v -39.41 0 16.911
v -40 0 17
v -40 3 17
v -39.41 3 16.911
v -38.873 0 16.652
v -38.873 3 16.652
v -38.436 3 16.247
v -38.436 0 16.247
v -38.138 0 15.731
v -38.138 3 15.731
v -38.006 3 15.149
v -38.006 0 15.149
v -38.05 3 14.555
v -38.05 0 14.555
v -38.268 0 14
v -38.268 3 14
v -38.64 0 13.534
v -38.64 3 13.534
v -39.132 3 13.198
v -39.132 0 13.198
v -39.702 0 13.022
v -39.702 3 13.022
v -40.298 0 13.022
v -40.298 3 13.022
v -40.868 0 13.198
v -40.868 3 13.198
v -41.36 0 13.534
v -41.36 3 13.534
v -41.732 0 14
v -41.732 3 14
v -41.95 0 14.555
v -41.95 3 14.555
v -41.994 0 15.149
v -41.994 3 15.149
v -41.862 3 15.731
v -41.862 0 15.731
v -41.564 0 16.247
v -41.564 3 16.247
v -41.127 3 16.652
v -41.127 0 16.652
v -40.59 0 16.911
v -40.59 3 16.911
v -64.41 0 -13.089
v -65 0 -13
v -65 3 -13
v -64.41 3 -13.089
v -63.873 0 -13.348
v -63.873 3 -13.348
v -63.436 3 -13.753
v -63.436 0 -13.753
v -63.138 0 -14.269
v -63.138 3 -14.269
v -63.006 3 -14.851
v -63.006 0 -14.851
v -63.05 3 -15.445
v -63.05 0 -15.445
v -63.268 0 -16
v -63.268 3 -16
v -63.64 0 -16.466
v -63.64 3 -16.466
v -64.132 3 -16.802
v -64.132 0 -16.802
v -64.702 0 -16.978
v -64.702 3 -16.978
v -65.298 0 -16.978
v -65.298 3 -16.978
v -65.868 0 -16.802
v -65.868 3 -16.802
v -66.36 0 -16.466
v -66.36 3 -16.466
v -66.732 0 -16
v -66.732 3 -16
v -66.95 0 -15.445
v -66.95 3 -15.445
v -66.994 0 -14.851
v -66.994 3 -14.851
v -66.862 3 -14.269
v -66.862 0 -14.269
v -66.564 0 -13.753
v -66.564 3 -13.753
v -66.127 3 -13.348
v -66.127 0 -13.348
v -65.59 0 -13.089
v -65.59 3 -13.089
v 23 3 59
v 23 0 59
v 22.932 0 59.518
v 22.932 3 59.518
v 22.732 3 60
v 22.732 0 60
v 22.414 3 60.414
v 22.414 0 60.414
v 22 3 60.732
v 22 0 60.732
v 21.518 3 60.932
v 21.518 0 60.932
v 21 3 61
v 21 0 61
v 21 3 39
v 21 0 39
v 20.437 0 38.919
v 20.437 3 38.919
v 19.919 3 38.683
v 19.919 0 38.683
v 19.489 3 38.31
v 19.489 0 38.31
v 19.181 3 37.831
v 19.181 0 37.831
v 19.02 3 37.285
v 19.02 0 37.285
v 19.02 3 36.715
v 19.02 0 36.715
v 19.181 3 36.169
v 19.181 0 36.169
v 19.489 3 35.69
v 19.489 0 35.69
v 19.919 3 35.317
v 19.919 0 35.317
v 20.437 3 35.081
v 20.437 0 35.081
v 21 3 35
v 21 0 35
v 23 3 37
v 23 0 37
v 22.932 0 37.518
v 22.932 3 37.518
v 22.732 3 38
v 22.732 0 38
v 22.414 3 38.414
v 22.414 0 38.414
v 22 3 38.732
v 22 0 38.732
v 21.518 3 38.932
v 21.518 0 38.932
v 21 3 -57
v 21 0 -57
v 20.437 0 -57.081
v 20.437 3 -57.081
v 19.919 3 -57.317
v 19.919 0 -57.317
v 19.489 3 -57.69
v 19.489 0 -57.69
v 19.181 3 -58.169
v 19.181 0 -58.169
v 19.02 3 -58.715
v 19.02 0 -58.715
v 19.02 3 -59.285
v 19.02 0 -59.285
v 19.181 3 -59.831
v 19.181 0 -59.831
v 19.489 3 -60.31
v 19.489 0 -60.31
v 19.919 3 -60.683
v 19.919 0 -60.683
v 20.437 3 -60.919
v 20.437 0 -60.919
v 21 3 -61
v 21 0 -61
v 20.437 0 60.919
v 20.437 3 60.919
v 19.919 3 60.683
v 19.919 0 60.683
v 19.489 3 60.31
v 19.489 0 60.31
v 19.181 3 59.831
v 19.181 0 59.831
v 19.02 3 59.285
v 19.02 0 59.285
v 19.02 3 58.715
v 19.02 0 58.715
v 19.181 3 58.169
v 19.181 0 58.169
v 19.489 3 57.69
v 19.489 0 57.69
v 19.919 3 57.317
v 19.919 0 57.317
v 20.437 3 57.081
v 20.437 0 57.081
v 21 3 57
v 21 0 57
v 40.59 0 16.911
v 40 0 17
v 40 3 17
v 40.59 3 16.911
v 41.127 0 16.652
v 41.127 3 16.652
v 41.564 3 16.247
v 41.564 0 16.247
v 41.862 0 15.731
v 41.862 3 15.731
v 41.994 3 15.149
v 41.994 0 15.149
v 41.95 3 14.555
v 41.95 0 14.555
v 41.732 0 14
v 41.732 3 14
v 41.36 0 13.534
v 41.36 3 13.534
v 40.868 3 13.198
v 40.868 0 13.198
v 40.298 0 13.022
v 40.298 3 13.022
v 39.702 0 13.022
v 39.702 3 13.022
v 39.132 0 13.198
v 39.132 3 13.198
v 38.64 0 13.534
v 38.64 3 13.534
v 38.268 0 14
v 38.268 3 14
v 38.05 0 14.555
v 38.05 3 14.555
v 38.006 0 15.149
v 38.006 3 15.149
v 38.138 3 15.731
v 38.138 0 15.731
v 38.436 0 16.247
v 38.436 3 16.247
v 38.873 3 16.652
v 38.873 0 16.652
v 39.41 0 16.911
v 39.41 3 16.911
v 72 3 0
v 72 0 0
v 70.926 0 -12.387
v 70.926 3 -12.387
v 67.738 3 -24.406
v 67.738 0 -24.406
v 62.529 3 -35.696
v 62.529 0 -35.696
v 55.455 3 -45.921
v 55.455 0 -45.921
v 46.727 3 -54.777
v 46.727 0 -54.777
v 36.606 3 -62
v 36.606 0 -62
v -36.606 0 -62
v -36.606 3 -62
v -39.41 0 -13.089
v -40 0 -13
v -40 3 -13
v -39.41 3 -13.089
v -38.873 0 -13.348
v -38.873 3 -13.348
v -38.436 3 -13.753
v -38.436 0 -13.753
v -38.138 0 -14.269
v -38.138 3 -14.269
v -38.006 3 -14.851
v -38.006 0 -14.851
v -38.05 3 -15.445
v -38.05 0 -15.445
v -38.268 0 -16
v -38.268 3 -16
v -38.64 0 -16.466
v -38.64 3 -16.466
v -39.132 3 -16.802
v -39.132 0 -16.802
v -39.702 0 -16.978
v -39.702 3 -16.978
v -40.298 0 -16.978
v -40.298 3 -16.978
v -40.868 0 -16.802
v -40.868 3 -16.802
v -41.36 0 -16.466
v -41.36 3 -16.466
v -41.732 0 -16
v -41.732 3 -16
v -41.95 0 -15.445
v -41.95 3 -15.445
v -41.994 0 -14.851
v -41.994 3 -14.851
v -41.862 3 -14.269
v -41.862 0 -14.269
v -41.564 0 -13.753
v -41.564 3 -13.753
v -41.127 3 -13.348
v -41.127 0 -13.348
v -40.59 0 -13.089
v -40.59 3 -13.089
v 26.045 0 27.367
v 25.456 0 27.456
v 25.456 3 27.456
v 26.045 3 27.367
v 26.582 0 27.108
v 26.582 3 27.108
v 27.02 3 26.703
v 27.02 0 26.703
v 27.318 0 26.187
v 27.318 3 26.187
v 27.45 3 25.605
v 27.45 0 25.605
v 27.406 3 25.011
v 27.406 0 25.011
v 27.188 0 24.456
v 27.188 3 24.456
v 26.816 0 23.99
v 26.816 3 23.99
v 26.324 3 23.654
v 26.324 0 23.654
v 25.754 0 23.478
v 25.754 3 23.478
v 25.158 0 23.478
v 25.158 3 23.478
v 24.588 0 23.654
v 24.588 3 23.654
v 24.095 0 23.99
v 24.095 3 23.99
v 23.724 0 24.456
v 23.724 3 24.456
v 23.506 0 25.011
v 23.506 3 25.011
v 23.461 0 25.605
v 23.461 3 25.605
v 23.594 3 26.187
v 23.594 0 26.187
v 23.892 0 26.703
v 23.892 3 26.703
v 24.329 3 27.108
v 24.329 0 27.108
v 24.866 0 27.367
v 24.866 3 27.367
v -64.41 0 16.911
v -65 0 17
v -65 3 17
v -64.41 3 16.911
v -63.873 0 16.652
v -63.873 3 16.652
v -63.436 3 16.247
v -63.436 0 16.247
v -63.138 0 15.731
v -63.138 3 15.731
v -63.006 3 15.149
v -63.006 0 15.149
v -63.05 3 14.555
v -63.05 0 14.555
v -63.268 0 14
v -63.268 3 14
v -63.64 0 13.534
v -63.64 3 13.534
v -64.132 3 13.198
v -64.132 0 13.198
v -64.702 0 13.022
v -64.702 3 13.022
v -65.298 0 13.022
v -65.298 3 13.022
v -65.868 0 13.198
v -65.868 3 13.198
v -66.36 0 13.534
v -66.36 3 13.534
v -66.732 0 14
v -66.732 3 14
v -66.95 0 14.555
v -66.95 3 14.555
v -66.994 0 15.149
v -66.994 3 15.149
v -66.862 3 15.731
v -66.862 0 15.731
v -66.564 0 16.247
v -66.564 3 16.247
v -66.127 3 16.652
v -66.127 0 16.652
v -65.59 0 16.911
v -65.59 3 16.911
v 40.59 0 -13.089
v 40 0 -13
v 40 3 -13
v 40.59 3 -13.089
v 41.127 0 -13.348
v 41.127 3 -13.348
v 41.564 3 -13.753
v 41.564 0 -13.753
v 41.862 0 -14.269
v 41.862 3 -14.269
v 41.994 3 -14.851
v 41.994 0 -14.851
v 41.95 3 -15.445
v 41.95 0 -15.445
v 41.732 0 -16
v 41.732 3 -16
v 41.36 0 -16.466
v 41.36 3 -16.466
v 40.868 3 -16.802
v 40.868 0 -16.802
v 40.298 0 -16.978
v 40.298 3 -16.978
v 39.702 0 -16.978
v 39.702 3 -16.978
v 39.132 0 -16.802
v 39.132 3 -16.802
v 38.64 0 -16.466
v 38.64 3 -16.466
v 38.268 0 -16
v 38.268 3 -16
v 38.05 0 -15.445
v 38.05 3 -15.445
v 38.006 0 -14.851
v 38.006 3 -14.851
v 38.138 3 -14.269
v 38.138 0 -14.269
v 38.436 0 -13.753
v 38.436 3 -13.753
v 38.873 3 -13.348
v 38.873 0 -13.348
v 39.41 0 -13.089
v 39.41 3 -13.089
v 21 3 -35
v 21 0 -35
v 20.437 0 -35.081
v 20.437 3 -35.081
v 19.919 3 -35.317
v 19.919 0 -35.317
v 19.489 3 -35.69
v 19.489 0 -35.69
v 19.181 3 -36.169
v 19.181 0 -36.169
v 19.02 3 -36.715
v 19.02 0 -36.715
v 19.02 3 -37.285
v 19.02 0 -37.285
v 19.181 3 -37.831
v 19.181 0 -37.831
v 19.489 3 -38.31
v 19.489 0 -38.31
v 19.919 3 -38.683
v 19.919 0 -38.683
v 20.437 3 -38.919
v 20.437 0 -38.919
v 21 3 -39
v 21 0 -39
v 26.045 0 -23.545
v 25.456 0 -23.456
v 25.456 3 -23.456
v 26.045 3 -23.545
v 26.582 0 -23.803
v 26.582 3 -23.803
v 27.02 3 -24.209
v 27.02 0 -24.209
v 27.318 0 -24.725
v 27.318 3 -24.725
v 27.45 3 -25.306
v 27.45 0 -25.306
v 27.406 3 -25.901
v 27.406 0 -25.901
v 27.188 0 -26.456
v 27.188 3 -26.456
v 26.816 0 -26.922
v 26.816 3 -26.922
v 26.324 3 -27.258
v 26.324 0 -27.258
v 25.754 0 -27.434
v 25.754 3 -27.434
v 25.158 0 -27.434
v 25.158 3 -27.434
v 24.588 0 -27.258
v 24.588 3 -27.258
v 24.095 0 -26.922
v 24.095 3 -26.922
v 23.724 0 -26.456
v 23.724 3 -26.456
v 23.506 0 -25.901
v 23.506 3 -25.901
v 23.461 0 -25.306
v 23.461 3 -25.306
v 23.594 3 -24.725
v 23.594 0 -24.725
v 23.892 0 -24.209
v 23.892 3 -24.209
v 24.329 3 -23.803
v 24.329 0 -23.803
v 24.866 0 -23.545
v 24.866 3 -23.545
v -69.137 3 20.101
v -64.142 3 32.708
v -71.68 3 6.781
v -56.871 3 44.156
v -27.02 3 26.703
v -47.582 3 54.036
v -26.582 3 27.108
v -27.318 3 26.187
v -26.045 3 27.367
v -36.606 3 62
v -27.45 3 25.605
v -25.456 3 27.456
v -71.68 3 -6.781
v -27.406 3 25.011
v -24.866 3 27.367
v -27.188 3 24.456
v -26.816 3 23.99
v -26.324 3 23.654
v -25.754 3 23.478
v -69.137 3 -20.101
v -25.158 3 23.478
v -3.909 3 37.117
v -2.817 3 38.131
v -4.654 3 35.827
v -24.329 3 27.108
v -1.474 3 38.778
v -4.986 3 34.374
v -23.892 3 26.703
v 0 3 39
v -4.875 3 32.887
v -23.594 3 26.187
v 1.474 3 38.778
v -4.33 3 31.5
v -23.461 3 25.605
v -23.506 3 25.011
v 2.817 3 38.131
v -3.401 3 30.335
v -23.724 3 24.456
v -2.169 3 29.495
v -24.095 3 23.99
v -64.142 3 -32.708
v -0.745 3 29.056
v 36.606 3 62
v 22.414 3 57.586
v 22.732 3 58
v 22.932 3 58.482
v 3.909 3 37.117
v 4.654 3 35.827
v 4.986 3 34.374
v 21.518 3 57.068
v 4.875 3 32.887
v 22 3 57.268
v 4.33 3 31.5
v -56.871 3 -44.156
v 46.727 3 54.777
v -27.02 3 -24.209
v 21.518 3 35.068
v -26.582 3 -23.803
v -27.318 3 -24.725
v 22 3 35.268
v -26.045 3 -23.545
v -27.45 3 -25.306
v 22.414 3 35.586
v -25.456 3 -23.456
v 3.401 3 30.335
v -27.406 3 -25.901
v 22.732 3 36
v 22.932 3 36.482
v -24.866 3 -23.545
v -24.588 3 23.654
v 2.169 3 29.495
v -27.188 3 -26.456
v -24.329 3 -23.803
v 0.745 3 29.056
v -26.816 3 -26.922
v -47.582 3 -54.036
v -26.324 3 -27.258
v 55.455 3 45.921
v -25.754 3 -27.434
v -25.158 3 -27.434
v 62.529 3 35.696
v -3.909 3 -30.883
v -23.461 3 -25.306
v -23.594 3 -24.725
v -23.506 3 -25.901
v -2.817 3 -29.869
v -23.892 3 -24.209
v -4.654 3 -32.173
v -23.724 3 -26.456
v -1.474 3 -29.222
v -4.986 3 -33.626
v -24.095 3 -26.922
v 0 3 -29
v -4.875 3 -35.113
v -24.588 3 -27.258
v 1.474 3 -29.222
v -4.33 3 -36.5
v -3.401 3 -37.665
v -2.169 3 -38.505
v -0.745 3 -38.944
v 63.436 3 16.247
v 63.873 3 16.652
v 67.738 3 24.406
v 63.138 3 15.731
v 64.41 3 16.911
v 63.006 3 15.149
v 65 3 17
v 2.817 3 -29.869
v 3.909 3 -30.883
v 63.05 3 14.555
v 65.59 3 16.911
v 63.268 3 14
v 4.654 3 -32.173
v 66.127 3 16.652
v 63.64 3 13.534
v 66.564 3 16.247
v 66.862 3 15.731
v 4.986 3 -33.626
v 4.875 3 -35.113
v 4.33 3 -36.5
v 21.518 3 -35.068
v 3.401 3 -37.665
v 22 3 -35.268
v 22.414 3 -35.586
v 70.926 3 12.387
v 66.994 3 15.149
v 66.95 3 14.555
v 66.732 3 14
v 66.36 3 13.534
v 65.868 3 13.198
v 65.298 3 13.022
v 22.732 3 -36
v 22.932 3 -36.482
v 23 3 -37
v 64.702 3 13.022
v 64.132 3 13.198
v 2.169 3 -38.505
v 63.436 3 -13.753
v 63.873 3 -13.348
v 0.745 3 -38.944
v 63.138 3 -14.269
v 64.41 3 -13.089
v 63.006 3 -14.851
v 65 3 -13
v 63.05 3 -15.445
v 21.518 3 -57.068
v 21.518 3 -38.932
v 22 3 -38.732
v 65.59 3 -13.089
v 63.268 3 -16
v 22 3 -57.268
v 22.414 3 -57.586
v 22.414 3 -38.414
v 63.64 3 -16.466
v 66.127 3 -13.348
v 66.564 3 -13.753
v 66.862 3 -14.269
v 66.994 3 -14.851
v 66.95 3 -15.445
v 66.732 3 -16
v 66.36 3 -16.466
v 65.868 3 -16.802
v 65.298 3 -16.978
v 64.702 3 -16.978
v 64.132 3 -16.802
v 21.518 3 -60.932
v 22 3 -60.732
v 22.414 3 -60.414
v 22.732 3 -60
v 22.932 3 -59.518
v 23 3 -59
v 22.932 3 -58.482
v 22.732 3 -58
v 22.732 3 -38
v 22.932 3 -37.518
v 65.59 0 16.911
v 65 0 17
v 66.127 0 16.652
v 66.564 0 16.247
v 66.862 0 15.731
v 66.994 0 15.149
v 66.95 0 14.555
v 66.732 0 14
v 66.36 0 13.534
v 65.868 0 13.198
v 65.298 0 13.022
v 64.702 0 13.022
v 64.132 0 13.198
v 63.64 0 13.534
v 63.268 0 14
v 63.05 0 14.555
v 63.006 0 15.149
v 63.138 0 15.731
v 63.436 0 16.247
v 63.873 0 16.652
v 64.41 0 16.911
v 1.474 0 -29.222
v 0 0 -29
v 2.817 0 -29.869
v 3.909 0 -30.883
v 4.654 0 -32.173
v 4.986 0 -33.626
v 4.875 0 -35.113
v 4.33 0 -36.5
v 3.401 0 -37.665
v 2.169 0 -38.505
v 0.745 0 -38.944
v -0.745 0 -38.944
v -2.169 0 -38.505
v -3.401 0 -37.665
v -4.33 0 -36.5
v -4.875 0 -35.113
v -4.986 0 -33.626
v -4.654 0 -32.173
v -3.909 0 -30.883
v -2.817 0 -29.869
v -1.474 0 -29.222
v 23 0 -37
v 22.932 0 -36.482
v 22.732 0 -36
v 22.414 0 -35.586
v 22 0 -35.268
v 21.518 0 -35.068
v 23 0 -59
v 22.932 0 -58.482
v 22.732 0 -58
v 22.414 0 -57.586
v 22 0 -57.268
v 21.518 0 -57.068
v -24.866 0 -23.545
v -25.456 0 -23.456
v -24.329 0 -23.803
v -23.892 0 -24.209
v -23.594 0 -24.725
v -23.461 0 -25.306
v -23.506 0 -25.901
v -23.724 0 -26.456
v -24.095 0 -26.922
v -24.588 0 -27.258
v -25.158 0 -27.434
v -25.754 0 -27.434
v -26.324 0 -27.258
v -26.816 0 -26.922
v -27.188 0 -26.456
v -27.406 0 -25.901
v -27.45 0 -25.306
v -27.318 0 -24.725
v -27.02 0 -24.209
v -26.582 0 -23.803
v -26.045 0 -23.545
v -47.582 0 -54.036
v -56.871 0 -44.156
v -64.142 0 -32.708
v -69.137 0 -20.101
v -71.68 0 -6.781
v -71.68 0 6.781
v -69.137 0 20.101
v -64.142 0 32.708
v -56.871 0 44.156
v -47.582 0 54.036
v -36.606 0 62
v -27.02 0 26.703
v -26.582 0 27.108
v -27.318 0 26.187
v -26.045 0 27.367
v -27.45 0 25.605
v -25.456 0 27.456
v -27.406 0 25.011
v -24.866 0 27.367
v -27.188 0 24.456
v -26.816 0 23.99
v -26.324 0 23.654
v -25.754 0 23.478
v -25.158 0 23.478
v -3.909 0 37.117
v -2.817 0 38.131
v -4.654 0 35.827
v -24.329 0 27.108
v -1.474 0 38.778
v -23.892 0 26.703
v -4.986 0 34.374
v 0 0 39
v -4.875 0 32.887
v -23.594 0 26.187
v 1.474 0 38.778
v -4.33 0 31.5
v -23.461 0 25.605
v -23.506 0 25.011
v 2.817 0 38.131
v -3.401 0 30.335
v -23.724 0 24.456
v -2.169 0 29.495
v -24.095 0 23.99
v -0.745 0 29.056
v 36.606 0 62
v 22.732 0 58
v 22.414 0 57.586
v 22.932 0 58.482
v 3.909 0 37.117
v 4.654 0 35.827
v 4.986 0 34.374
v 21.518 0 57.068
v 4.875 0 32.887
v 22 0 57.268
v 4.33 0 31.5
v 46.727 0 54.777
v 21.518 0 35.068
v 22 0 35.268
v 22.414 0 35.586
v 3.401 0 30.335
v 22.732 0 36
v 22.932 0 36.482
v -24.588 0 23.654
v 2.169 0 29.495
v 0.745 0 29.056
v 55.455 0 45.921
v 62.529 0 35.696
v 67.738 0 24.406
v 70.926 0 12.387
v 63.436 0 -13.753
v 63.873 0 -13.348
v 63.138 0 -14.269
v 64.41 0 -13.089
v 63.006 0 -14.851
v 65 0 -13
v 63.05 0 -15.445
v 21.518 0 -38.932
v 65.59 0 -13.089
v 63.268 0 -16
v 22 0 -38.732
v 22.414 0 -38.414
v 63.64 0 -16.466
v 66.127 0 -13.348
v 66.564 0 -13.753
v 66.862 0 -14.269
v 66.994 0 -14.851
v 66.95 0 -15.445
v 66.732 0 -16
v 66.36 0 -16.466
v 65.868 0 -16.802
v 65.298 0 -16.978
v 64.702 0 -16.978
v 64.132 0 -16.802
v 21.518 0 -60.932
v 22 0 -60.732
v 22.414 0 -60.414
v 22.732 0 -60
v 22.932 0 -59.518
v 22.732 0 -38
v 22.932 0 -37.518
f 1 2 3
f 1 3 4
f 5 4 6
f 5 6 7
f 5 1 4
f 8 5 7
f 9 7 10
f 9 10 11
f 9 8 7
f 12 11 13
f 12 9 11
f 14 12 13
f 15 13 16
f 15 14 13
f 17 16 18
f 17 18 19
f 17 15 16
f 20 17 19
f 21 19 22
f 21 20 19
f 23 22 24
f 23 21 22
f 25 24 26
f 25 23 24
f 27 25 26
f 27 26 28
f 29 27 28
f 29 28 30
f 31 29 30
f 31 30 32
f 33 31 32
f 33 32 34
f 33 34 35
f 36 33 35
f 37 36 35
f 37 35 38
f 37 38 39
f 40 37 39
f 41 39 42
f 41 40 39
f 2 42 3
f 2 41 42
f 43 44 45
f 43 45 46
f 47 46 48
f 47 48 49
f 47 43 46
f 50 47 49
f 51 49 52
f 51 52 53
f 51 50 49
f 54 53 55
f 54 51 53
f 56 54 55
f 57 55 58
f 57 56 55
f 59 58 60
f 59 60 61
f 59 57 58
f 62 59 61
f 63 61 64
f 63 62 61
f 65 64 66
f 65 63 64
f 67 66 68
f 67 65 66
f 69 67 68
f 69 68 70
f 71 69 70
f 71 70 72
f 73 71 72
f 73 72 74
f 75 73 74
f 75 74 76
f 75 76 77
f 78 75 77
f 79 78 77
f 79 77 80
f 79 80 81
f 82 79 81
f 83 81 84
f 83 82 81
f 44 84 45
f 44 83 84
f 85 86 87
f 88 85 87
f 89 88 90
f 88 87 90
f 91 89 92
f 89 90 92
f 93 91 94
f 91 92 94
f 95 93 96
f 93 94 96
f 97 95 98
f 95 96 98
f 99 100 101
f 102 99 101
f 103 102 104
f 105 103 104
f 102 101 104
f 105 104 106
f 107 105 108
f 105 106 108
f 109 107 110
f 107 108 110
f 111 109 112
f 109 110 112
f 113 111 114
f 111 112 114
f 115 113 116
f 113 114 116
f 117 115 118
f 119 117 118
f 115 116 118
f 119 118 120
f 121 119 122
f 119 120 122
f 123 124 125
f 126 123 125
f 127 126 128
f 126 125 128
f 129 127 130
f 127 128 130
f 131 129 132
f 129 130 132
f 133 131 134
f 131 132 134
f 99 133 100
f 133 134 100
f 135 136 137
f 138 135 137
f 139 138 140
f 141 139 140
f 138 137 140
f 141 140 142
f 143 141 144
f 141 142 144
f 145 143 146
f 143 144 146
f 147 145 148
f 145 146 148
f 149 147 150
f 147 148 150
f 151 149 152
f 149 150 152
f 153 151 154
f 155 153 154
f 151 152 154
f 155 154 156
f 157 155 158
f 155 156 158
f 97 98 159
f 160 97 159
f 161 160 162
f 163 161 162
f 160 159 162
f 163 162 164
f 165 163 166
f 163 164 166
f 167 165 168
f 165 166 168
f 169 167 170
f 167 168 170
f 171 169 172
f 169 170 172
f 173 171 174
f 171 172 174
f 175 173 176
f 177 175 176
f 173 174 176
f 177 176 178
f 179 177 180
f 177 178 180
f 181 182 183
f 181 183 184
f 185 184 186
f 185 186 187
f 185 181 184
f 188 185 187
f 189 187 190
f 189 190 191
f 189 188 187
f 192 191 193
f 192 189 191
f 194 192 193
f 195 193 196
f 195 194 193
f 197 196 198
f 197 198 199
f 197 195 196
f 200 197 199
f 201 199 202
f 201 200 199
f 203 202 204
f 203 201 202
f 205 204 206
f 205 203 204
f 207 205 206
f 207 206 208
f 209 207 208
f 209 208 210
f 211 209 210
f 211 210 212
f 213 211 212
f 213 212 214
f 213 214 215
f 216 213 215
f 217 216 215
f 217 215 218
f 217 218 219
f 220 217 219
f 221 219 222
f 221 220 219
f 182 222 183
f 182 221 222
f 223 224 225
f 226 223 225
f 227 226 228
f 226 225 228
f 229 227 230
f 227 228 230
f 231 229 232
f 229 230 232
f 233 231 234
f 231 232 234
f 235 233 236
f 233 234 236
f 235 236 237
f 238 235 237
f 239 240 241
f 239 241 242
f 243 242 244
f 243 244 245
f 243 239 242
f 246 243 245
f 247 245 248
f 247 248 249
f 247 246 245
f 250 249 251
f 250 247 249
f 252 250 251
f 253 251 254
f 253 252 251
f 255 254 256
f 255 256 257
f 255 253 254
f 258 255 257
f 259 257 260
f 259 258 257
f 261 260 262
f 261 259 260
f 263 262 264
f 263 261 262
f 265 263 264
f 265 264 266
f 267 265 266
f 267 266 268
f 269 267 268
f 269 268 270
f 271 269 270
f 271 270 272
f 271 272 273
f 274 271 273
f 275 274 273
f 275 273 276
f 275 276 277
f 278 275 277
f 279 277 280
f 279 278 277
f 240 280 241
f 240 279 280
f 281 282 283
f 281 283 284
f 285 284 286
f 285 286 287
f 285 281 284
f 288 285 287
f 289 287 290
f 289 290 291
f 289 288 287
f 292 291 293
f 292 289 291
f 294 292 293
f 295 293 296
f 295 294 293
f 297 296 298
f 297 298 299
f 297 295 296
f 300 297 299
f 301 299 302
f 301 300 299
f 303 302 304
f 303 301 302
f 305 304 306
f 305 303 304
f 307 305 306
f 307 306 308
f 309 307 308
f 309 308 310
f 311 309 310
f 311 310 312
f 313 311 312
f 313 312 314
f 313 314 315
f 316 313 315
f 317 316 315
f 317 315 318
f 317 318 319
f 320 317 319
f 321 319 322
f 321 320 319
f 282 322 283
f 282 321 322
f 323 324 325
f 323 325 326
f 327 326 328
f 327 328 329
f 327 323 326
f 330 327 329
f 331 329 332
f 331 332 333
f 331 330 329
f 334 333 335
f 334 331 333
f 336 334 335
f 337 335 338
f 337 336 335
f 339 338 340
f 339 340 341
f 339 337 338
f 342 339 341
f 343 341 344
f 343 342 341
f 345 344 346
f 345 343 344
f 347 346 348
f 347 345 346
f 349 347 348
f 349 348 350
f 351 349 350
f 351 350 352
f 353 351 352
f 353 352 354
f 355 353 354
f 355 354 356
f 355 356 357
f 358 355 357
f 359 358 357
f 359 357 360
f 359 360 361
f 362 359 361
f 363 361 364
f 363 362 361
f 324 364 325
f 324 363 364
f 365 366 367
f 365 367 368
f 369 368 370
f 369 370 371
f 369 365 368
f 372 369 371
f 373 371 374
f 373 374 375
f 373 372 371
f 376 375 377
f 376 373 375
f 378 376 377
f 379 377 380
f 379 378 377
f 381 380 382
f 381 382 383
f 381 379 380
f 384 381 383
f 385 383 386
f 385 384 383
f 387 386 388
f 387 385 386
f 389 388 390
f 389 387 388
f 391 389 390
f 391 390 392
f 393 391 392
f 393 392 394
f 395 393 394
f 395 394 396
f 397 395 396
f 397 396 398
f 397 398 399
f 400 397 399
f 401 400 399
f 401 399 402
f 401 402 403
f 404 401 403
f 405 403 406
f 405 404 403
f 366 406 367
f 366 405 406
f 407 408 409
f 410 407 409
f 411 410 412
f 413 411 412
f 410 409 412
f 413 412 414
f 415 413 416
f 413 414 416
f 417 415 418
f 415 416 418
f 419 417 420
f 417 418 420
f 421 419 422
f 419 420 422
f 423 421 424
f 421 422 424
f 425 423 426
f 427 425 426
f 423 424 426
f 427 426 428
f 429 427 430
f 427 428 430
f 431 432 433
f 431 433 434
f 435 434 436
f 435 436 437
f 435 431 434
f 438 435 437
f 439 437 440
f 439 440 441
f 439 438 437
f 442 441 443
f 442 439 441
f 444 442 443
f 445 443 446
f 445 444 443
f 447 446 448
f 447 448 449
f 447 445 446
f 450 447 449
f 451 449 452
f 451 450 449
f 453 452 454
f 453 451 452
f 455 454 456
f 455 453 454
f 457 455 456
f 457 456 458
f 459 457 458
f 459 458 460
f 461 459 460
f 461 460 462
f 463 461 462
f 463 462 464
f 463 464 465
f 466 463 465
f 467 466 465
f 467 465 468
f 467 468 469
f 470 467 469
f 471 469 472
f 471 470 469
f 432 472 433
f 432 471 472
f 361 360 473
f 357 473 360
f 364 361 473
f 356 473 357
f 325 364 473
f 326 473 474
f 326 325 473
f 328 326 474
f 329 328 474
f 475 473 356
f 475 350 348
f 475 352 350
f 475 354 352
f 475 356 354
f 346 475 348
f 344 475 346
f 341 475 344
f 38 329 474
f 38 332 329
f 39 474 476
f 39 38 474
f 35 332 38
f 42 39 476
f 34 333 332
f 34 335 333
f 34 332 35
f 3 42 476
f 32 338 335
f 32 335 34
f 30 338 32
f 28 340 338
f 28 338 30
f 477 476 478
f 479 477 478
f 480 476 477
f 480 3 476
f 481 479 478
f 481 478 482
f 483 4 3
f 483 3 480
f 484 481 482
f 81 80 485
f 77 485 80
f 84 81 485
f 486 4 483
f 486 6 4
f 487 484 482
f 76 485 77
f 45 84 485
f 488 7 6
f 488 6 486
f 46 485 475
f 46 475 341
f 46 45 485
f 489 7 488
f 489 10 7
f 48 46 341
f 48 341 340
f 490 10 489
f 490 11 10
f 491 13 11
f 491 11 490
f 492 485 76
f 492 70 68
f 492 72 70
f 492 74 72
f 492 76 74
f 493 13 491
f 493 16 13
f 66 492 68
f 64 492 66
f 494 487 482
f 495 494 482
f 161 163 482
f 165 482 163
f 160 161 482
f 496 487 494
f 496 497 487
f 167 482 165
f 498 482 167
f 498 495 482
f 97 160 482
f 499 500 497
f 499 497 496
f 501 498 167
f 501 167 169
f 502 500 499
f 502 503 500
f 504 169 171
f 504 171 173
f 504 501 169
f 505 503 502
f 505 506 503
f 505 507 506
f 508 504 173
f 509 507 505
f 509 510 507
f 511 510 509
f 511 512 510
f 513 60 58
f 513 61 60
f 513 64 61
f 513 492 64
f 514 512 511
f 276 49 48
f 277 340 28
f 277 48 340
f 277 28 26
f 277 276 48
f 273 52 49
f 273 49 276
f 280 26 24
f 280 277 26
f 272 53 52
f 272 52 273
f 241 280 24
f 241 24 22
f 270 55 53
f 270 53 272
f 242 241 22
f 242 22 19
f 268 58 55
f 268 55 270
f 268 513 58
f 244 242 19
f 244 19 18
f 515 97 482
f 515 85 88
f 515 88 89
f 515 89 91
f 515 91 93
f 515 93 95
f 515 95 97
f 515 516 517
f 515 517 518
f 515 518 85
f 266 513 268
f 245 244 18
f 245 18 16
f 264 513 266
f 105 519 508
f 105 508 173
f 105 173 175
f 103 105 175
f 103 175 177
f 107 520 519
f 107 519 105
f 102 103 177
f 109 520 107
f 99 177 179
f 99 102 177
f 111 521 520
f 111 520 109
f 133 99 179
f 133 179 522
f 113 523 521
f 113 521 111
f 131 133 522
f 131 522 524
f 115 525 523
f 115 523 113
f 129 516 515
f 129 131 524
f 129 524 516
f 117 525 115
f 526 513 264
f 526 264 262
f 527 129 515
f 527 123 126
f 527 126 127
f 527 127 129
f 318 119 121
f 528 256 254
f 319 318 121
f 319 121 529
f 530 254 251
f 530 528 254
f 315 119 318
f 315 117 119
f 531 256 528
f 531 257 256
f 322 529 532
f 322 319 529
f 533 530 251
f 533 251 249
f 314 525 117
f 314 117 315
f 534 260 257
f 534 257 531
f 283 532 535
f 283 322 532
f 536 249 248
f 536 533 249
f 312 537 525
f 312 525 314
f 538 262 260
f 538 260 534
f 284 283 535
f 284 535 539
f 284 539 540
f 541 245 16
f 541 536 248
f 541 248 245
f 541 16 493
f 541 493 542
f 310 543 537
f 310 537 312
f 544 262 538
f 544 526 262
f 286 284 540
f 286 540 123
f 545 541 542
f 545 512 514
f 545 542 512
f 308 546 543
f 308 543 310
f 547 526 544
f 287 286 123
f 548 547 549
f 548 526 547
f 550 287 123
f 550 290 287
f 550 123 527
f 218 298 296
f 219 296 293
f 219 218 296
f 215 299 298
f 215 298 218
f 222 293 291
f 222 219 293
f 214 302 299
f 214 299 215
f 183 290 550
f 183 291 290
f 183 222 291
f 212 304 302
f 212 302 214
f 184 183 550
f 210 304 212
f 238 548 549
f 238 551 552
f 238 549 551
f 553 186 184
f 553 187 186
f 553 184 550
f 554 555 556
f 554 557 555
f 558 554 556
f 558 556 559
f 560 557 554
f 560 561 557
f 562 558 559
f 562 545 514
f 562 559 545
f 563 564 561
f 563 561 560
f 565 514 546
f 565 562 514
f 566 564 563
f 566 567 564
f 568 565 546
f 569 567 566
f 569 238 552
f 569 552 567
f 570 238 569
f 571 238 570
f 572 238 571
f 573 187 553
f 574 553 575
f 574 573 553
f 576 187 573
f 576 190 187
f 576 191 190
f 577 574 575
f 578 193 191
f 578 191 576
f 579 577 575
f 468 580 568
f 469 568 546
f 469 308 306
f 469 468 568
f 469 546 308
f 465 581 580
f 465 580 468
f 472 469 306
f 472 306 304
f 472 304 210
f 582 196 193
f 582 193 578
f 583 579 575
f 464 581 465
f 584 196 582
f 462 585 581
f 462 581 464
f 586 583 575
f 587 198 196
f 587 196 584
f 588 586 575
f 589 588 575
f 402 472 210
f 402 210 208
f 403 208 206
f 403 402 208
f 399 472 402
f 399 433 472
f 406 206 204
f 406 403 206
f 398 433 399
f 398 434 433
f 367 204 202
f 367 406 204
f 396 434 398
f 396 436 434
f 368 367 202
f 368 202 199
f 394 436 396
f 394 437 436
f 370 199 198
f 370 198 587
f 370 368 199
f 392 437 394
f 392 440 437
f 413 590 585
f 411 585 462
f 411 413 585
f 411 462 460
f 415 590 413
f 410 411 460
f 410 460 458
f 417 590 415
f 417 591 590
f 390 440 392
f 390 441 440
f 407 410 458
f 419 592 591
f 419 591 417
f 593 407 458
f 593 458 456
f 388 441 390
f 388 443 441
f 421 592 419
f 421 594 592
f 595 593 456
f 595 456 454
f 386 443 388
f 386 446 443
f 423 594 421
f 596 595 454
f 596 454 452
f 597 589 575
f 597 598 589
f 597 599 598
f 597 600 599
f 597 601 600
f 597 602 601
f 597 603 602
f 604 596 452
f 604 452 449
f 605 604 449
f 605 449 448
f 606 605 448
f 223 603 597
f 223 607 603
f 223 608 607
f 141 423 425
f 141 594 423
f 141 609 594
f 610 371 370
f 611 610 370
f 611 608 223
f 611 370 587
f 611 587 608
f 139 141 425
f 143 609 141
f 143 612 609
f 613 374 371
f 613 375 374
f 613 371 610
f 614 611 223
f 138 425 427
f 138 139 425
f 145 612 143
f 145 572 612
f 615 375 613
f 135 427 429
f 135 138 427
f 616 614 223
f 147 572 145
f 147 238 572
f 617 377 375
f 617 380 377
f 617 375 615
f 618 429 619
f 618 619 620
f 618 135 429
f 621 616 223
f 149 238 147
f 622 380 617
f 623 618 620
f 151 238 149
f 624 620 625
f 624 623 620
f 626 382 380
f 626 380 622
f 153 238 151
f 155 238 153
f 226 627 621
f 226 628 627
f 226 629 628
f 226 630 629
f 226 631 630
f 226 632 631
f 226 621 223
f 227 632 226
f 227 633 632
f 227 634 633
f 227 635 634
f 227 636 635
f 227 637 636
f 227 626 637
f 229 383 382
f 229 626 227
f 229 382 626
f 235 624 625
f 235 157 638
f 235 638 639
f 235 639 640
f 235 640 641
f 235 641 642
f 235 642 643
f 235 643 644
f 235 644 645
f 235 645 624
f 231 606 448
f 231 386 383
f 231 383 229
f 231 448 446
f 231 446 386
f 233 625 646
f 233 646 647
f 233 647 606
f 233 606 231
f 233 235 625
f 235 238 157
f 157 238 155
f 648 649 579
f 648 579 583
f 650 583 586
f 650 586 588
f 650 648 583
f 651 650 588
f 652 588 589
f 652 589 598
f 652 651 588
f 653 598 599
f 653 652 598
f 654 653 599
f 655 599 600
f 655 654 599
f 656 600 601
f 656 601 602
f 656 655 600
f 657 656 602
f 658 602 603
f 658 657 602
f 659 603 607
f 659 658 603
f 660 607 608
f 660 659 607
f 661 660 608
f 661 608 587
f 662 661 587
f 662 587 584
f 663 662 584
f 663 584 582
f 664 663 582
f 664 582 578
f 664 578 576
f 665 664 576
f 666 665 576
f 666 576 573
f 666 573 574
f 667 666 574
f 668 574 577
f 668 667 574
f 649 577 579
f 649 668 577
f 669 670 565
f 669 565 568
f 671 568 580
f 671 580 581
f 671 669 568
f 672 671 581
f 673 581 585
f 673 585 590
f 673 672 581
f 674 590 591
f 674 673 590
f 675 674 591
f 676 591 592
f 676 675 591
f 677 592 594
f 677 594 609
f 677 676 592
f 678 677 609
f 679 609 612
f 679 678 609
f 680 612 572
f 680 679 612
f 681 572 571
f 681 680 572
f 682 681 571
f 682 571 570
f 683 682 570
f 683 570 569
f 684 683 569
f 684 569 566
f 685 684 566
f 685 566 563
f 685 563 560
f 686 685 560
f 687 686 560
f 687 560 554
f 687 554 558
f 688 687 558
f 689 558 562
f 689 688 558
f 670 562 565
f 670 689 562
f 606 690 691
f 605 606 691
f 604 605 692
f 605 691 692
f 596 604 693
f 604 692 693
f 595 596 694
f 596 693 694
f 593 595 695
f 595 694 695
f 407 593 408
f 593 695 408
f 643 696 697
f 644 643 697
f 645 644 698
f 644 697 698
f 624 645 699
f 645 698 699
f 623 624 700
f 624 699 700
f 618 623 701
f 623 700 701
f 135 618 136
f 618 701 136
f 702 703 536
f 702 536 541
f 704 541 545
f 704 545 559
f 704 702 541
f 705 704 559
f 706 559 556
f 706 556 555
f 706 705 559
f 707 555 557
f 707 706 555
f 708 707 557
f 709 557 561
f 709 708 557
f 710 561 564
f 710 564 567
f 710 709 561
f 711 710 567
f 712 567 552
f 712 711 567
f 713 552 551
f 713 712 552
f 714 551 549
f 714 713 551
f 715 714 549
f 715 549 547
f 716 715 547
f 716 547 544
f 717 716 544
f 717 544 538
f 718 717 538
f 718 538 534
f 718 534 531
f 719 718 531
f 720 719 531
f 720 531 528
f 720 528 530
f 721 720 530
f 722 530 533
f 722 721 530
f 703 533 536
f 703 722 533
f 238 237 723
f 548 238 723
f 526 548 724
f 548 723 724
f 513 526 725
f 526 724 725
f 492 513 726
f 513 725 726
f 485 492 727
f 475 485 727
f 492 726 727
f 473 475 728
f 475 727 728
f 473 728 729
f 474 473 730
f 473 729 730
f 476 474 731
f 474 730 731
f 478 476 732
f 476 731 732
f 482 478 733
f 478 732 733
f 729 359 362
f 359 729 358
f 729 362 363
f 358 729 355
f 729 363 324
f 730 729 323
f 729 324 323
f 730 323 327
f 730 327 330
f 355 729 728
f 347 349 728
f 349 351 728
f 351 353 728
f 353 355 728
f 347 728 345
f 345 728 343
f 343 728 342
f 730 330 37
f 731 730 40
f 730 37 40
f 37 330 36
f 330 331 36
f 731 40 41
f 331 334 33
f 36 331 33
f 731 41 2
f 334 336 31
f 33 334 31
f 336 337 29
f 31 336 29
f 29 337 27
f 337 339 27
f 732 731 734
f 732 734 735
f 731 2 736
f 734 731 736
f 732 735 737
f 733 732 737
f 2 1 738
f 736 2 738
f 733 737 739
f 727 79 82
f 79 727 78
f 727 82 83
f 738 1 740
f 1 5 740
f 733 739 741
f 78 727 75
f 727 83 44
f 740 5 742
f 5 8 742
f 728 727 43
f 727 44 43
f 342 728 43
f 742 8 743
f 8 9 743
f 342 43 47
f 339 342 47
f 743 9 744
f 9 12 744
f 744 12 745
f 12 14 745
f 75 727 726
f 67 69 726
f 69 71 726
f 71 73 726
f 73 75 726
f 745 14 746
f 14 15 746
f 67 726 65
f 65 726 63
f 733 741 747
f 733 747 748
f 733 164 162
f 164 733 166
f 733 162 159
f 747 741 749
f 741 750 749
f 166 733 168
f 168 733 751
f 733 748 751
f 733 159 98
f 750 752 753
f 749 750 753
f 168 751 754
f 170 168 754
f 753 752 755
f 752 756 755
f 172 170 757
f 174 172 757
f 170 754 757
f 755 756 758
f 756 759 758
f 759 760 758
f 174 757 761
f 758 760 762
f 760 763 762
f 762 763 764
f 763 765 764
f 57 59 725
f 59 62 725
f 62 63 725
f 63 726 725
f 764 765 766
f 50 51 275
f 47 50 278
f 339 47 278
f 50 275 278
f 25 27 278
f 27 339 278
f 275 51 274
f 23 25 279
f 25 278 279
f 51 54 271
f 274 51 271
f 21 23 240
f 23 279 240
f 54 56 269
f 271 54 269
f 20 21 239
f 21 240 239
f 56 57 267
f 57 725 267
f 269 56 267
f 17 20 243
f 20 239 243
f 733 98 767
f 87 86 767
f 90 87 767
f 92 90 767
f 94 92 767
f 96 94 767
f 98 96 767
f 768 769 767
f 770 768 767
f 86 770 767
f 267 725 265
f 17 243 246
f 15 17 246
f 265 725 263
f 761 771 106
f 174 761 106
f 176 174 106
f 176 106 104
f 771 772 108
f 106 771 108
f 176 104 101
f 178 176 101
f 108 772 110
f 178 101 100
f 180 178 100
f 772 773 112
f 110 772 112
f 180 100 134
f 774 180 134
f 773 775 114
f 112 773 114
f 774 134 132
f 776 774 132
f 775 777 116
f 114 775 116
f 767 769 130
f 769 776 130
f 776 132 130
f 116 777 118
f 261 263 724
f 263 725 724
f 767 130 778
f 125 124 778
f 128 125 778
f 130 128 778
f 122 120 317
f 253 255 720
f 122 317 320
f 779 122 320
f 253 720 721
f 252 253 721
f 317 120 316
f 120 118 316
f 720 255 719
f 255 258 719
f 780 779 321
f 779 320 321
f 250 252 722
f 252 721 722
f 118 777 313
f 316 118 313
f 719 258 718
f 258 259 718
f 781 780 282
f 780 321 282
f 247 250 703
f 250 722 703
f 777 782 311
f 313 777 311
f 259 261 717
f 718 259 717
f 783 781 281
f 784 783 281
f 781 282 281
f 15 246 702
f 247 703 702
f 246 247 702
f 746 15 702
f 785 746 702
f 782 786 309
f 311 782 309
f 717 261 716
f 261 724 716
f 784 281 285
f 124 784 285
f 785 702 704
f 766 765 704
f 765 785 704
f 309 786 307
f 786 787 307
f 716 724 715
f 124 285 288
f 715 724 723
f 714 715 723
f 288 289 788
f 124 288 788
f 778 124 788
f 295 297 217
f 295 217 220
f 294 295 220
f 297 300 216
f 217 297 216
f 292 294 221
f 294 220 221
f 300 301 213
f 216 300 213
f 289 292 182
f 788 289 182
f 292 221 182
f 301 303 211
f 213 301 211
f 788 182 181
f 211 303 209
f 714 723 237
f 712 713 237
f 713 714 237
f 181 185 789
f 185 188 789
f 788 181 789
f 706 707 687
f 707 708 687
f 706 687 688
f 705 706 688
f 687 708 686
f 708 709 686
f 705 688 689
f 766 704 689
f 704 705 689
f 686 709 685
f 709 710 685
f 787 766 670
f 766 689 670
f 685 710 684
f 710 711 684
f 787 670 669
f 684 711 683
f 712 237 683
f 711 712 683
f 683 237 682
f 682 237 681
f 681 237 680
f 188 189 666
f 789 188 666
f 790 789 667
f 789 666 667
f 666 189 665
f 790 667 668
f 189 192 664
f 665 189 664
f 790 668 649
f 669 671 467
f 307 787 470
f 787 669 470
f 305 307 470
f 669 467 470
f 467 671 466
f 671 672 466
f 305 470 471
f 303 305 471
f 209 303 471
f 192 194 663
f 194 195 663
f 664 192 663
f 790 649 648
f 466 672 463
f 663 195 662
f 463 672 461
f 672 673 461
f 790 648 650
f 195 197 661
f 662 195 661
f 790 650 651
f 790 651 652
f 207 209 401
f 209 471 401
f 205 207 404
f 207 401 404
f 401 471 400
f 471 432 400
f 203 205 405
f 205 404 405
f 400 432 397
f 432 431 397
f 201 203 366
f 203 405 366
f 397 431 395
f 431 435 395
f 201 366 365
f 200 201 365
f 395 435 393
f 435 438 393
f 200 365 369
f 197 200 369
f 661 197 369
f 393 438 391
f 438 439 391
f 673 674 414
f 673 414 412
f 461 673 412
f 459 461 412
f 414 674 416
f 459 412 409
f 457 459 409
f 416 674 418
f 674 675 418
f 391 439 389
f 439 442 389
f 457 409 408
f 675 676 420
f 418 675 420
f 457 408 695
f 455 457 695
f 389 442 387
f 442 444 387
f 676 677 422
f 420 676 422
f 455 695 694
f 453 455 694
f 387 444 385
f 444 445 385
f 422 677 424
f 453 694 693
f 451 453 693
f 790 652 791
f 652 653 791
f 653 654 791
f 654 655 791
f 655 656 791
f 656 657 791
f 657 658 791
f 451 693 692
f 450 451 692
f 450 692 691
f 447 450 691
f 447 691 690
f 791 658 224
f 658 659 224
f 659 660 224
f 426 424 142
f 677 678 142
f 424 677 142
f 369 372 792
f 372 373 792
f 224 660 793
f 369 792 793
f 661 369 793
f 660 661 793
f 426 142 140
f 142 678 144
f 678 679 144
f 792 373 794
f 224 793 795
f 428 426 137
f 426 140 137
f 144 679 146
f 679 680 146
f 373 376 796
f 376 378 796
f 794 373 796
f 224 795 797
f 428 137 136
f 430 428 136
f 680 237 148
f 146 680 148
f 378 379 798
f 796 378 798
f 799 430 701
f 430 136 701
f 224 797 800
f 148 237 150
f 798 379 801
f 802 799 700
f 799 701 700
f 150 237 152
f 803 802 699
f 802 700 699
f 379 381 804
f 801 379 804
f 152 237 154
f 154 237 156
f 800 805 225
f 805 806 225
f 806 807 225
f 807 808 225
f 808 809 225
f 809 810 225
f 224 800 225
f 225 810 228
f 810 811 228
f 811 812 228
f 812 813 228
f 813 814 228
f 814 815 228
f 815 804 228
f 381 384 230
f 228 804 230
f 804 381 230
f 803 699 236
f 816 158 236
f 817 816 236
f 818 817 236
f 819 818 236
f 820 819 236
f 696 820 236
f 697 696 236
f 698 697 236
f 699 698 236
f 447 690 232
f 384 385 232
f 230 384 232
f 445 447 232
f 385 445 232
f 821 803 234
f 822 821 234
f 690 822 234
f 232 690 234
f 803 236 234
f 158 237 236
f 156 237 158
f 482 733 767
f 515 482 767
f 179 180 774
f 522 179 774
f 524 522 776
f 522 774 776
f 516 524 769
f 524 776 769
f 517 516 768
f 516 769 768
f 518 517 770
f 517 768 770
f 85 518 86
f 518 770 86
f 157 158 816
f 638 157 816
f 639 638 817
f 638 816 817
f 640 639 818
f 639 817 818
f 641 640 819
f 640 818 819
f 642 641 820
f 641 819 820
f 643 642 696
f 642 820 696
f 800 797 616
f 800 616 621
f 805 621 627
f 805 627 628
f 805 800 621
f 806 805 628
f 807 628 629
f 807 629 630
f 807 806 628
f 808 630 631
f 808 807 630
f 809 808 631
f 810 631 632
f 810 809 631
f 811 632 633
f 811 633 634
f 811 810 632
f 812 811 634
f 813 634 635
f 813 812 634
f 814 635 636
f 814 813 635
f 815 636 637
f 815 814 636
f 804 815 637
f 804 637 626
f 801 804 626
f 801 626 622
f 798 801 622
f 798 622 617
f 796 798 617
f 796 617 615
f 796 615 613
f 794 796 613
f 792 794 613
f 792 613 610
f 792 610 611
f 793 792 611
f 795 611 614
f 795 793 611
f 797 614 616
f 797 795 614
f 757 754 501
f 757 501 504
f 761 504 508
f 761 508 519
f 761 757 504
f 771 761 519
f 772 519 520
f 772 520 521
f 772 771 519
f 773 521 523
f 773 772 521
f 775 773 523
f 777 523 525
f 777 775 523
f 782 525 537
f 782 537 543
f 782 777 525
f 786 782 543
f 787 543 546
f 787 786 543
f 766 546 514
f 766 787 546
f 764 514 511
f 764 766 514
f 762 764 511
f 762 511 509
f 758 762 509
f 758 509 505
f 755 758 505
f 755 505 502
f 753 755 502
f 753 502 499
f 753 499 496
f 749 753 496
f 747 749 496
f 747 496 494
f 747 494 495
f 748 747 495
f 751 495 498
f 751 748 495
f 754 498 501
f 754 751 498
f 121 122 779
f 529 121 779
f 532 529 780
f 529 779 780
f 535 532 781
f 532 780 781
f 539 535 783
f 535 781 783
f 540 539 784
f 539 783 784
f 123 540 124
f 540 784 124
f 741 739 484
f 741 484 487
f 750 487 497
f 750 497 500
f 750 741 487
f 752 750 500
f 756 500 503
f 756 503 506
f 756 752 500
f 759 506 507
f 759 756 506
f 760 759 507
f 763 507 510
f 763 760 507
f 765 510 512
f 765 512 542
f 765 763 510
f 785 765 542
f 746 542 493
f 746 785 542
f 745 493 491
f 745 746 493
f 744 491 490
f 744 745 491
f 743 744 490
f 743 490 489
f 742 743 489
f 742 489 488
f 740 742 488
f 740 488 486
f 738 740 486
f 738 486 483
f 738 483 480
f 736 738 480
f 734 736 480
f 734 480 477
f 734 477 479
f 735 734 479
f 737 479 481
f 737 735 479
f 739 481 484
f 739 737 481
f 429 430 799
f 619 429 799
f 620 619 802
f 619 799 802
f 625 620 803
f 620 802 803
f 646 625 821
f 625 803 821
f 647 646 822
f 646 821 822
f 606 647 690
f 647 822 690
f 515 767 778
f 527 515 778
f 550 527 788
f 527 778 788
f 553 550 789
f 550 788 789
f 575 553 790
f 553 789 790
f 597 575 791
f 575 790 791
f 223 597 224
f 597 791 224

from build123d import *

# Parameters (mm, degrees)
SKETCH1_R           = 2
SKETCH1_R_2         = 5
BOSS_EXTRUDE2_DEPTH = 3


with BuildPart() as part:
    # Sketch1 → Boss-Extrude2 (new body)
    # profile 1 of 2: a face of its own
    with BuildSketch(Plane(origin=(0, 0, 0), x_dir=(1, 0, 0), z_dir=(0, 1, 0))):
        with BuildLine():
            Line((-36.606010435, -62), (0, -62))
            Line((0, -62), (21, -62))
            Line((21, -62), (21, -61))
            ThreePointArc((21, -61), (19, -59), (21, -57))
            Line((21, -57), (21, -39))
            ThreePointArc((21, -39), (19, -37), (21, -35))
            Line((21, -35), (21, 35))
            ThreePointArc((21, 35), (19, 37), (21, 39))
            Line((21, 39), (21, 57))
            ThreePointArc((21, 57), (19, 59), (21, 61))
            Line((21, 61), (21, 62))
            Line((21, 62), (-36.606010435, 62))
            ThreePointArc((-36.606010435, 62), (-72, 0), (-36.606010435, -62))
        make_face()
        with Locations(Location((-65, -15, 0), (0, 0, 270))):
            Circle(SKETCH1_R, mode=Mode.SUBTRACT)
        with Locations(Location((-40, -15, 0), (0, 0, 270))):
            Circle(SKETCH1_R, mode=Mode.SUBTRACT)
        with Locations(Location((-25.455844123, -25.455844123, 0), (0, 0, 270))):
            Circle(SKETCH1_R, mode=Mode.SUBTRACT)
        with Locations(Location((0, -34, 0), (0, 0, 270))):
            Circle(SKETCH1_R_2, mode=Mode.SUBTRACT)
        with Locations(Location((-65, 15, 0), (0, 0, 270))):
            Circle(SKETCH1_R, mode=Mode.SUBTRACT)
        with Locations(Location((-40, 15, 0), (0, 0, 270))):
            Circle(SKETCH1_R, mode=Mode.SUBTRACT)
        with Locations(Location((-25.455844123, 25.455844123, 0), (0, 0, 270))):
            Circle(SKETCH1_R, mode=Mode.SUBTRACT)
        with Locations(Location((0, 34, 0), (0, 0, 270))):
            Circle(SKETCH1_R_2, mode=Mode.SUBTRACT)
    # profile 2 of 2: a face of its own
    with BuildSketch(Plane(origin=(0, 0, 0), x_dir=(1, 0, 0), z_dir=(0, 1, 0))):
        with BuildLine():
            Line((21, -62), (36.606010435, -62))
            ThreePointArc((36.606010435, -62), (62.528524496, -35.695708766), (72, 0))
            ThreePointArc((72, 0), (62.528524496, 35.695708766), (36.606010435, 62))
            Line((36.606010435, 62), (21, 62))
            Line((21, 62), (21, 61))
            ThreePointArc((21, 61), (22.414213562, 60.414213562), (23, 59))
            ThreePointArc((23, 59), (22.414213562, 57.585786438), (21, 57))
            Line((21, 57), (21, 39))
            ThreePointArc((21, 39), (22.414213562, 38.414213562), (23, 37))
            ThreePointArc((23, 37), (22.414213562, 35.585786438), (21, 35))
            Line((21, 35), (21, -35))
            ThreePointArc((21, -35), (22.414213562, -35.585786438), (23, -37))
            ThreePointArc((23, -37), (22.414213562, -38.414213562), (21, -39))
            Line((21, -39), (21, -57))
            ThreePointArc((21, -57), (22.414213562, -57.585786438), (23, -59))
            ThreePointArc((23, -59), (22.414213562, -60.414213562), (21, -61))
            Line((21, -61), (21, -62))
        make_face()
        with Locations(Location((25.455844123, -25.455844123, 0), (0, 0, 270))):
            Circle(SKETCH1_R, mode=Mode.SUBTRACT)
        with Locations(Location((40, -15, 0), (0, 0, 270))):
            Circle(SKETCH1_R, mode=Mode.SUBTRACT)
        with Locations(Location((65, -15, 0), (0, 0, 270))):
            Circle(SKETCH1_R, mode=Mode.SUBTRACT)
        with Locations(Location((25.455844123, 25.455844123, 0), (0, 0, 270))):
            Circle(SKETCH1_R, mode=Mode.SUBTRACT)
        with Locations(Location((40, 15, 0), (0, 0, 270))):
            Circle(SKETCH1_R, mode=Mode.SUBTRACT)
        with Locations(Location((65, 15, 0), (0, 0, 270))):
            Circle(SKETCH1_R, mode=Mode.SUBTRACT)
    extrude(amount=BOSS_EXTRUDE2_DEPTH)


solid = part.part
